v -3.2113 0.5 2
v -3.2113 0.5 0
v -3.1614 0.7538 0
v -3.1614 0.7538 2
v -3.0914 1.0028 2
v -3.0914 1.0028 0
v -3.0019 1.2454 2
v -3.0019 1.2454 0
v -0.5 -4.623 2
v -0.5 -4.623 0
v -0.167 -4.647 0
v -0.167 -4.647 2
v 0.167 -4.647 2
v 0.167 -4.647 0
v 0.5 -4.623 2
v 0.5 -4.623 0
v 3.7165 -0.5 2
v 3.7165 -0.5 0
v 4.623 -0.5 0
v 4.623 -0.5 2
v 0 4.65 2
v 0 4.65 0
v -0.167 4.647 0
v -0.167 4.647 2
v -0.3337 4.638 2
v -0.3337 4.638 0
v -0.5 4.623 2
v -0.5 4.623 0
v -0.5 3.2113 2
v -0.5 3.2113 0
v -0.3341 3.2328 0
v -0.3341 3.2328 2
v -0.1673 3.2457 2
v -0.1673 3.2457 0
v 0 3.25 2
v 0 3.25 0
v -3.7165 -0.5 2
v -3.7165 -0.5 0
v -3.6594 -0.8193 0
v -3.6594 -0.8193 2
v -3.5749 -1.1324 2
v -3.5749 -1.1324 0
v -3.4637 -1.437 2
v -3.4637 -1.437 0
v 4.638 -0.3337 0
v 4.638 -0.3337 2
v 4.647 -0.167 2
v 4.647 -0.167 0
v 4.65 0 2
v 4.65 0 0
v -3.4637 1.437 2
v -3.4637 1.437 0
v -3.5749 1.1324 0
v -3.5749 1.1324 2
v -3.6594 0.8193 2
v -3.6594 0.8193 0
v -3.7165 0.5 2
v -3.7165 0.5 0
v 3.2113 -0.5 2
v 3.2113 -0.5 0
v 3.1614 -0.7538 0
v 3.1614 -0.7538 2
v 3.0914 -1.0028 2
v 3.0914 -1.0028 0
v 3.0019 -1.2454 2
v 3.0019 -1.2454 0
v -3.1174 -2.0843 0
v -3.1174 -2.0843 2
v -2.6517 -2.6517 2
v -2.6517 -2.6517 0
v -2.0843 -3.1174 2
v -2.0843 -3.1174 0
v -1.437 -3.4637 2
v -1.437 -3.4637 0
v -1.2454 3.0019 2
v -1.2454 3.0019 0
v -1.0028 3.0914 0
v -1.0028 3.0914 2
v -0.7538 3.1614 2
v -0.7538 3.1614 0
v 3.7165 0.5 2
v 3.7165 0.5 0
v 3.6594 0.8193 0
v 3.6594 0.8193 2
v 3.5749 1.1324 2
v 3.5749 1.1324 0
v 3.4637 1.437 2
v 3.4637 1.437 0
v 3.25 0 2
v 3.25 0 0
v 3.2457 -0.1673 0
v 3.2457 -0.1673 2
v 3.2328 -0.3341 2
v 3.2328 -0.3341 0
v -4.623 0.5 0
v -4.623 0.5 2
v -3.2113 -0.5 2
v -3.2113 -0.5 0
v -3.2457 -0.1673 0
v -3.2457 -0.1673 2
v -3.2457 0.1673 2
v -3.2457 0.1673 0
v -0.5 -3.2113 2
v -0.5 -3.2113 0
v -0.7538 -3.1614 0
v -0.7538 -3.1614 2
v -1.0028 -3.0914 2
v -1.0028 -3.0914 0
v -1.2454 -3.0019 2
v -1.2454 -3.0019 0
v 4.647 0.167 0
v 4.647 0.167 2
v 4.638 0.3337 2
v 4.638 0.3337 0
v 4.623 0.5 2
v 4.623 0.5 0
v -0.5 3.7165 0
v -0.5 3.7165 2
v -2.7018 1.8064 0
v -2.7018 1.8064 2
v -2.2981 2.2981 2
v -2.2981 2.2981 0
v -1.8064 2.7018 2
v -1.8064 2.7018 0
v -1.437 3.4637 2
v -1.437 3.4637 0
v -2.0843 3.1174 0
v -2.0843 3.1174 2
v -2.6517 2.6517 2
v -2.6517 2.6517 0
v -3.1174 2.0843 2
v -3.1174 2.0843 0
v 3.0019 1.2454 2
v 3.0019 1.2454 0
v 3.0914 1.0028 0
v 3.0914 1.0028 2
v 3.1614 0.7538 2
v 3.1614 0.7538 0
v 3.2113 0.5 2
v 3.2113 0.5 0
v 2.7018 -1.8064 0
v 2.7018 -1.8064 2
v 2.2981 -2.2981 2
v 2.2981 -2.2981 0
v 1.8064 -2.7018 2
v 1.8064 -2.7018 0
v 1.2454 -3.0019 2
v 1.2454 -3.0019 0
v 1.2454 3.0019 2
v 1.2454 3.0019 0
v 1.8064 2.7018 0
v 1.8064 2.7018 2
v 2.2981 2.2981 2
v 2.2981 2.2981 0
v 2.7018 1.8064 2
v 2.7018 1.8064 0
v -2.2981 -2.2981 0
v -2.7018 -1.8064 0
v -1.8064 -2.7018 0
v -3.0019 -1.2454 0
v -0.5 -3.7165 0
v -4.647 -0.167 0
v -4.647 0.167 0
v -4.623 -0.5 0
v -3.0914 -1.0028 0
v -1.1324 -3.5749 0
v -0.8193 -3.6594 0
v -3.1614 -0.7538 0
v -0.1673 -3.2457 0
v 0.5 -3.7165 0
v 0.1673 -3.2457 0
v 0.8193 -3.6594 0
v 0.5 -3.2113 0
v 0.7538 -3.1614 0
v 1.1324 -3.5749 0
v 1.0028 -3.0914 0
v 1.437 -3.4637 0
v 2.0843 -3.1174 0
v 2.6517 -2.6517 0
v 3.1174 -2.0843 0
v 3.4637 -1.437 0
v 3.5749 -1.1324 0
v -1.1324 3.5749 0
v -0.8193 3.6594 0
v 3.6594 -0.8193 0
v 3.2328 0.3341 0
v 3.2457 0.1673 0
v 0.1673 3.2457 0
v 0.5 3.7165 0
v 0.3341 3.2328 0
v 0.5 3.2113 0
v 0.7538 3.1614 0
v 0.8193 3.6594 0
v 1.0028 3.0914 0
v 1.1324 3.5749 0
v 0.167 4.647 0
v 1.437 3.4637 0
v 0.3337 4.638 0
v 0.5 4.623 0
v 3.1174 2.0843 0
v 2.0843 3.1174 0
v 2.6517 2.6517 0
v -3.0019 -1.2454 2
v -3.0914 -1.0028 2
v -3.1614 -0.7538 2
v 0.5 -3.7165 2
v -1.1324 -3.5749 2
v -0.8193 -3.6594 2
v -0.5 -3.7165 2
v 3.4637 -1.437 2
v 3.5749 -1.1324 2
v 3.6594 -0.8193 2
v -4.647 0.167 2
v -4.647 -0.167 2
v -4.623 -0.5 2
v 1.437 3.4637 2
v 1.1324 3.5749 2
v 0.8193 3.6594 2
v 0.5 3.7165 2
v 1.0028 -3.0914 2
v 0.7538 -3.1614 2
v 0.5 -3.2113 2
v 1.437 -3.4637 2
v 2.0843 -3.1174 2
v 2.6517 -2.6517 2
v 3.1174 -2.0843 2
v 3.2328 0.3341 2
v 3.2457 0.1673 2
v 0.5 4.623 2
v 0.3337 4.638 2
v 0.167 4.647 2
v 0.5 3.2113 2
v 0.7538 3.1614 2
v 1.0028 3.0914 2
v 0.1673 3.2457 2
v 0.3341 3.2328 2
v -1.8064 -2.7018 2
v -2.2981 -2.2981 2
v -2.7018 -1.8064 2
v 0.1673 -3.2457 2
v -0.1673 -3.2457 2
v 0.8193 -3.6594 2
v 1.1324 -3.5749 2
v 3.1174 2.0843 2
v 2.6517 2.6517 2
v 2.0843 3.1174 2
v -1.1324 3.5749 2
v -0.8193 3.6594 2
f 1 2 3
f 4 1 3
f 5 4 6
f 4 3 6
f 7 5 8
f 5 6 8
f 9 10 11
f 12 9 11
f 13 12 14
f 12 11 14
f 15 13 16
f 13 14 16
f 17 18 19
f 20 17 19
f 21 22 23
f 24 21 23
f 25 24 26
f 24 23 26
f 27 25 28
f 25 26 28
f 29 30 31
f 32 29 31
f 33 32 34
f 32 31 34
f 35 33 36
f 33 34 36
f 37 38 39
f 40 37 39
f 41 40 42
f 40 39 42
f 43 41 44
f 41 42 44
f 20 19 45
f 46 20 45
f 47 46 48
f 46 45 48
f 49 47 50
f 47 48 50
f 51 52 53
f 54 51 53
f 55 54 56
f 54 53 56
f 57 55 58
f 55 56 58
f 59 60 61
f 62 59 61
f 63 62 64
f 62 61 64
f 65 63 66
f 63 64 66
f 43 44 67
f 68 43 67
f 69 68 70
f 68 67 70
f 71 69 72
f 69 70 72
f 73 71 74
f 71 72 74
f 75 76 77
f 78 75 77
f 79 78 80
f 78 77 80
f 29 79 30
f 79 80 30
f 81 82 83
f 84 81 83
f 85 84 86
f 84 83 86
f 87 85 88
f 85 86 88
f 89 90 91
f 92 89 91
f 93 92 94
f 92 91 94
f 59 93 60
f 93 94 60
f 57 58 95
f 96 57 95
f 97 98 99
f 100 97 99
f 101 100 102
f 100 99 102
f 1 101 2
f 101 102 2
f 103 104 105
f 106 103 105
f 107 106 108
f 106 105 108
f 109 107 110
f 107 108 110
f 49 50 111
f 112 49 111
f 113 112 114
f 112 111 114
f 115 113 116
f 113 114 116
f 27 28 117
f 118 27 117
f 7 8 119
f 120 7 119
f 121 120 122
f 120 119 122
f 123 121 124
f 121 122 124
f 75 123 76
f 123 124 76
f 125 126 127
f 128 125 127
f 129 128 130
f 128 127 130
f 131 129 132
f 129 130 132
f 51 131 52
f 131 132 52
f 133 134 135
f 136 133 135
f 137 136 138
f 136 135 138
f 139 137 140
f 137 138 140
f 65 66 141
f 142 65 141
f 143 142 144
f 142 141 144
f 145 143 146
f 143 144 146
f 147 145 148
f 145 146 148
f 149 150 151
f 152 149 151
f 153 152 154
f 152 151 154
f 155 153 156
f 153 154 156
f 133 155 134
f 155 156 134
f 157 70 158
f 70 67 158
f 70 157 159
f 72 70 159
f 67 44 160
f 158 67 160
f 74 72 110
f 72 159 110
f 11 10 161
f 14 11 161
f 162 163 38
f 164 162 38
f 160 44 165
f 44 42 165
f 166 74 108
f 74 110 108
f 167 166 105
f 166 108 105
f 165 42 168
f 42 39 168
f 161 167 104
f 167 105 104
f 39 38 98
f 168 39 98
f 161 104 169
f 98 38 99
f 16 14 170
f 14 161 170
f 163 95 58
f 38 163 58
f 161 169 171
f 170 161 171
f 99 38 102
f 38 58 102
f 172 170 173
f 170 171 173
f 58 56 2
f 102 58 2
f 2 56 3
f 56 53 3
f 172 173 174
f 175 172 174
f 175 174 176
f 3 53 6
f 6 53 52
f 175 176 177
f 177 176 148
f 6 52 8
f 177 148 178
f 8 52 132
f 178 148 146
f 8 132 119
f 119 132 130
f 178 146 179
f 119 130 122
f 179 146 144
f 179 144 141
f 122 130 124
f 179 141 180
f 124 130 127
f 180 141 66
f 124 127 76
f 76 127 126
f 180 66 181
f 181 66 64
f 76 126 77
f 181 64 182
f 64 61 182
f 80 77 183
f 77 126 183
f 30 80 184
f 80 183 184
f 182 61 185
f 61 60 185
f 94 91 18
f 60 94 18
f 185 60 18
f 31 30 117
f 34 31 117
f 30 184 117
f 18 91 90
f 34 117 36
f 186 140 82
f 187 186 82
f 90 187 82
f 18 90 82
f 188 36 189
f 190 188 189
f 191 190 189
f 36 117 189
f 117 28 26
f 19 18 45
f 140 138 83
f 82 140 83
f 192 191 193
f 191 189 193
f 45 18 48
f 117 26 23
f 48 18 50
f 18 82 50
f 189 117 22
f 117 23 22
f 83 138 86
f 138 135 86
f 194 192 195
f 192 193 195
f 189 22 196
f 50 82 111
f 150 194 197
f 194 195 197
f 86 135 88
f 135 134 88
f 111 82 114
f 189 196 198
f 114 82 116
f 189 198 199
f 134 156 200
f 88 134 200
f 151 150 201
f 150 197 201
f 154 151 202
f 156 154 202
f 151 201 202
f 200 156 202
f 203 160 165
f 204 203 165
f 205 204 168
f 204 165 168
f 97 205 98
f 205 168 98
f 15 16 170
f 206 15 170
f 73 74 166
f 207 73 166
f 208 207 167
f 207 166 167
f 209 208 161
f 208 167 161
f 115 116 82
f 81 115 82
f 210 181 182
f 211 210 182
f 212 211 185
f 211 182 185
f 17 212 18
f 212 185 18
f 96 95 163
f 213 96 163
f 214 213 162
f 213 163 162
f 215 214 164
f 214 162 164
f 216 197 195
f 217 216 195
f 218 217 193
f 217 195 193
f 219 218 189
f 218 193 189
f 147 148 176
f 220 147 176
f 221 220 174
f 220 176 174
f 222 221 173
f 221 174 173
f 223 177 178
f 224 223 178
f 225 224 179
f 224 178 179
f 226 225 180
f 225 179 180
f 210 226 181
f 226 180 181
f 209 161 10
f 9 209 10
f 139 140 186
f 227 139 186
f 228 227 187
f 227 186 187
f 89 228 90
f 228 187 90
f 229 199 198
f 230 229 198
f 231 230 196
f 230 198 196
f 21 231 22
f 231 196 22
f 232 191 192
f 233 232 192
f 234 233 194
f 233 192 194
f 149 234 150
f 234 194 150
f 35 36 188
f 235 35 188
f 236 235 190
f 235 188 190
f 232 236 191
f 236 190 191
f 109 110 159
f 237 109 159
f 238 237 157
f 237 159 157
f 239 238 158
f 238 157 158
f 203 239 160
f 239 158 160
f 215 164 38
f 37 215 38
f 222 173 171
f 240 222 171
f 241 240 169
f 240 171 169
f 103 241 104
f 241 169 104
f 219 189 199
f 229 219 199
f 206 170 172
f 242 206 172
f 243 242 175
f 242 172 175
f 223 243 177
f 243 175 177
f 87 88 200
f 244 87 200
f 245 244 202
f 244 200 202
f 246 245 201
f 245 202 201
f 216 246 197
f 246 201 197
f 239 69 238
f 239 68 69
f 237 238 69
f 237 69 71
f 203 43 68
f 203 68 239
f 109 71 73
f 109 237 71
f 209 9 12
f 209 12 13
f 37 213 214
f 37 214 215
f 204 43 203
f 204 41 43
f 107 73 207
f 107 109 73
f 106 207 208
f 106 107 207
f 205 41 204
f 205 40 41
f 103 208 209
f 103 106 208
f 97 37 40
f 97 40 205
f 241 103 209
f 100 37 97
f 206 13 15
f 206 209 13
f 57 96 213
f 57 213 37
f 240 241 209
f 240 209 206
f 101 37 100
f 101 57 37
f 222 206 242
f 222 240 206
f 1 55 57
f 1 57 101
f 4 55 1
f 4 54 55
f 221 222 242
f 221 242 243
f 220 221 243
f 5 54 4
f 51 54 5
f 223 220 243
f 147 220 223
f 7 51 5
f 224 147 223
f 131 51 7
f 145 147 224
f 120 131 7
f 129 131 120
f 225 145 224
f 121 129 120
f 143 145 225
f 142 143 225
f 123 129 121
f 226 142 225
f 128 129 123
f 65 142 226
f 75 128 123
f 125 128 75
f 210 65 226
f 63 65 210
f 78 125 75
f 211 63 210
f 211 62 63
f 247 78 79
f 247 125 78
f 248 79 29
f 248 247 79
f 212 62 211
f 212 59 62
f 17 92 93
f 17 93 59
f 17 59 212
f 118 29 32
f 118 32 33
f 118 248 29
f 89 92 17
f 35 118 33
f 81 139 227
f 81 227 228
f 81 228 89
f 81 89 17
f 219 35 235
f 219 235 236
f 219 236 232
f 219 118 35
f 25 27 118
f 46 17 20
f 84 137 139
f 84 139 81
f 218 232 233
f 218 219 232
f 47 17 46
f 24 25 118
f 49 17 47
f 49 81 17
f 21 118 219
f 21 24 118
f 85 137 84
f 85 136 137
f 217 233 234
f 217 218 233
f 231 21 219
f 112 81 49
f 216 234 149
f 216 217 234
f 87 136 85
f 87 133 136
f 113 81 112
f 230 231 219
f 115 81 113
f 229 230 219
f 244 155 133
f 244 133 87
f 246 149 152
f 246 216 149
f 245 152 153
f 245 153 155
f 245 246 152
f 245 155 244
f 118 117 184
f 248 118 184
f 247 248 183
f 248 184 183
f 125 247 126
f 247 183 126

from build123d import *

# Parameters (mm, degrees)
F1_DEPTH = 2


with BuildPart() as f1:
    # F0 (on Top) → F1 (new body)
    with BuildSketch(Plane.XY):
        with BuildLine():
            ThreePointArc((0, 4.15), (0.2504565274, 4.1424354585), (0.5, 4.119769411))
            Line((0.5, 4.119769411), (0.5, 4.6230401253))
            ThreePointArc((0.5, 4.6230401253), (0.2503631537, 4.6432551396), (0, 4.65))
            Line((0, 4.65), (0, 4.15))
        make_face()
        with BuildLine():
            ThreePointArc((-0.5, 4.119769411), (-0.2504565274, 4.1424354585), (0, 4.15))
            Line((0, 4.15), (0, 4.65))
            ThreePointArc((0, 4.65), (-0.2503631537, 4.6432551396), (-0.5, 4.6230401253))
            Line((-0.5, 4.6230401253), (-0.5, 4.119769411))
        make_face()
        with BuildLine():
            ThreePointArc((-0.5, 3.7165171868), (-0.2505599224, 3.7416199333), (0, 3.75))
            Line((0, 3.75), (0, 4.15))
            ThreePointArc((0, 4.15), (-0.2504565274, 4.1424354585), (-0.5, 4.119769411))
            Line((-0.5, 4.119769411), (-0.5, 3.7165171868))
        make_face()
        with BuildLine():
            ThreePointArc((0, 3.75), (0.2505599224, 3.7416199333), (0.5, 3.7165171868))
            Line((0.5, 3.7165171868), (0.5, 4.119769411))
            ThreePointArc((0.5, 4.119769411), (0.2504565274, 4.1424354585), (0, 4.15))
            Line((0, 4.15), (0, 3.75))
        make_face()
        with BuildLine():
            ThreePointArc((0, 3.25), (0.2507474126, 3.2403125984), (0.5, 3.2113081447))
            Line((0.5, 3.2113081447), (0.5, 3.7165171868))
            ThreePointArc((0.5, 3.7165171868), (0.2505599224, 3.7416199333), (0, 3.75))
            Line((0, 3.75), (0, 3.25))
        make_face()
        with BuildLine():
            ThreePointArc((-0.5, 3.2113081447), (-0.2507474126, 3.2403125984), (0, 3.25))
            Line((0, 3.25), (0, 3.75))
            ThreePointArc((0, 3.75), (-0.2505599224, 3.7416199333), (-0.5, 3.7165171868))
            Line((-0.5, 3.7165171868), (-0.5, 3.2113081447))
        make_face()
        with BuildLine():
            ThreePointArc((-1.2454248934, 3.0019022028), (-0.8789708338, 3.128883231), (-0.5, 3.2113081447))
            Line((-0.5, 3.2113081447), (-0.5, 3.7165171868))
            ThreePointArc((-0.5, 3.7165171868), (-0.9767266714, 3.6205669459), (-1.4370287231, 3.4637333109))
            Line((-1.4370287231, 3.4637333109), (-1.2454248934, 3.0019022028))
        make_face()
        with BuildLine():
            ThreePointArc((0.5, 3.2113081447), (0.8789708338, 3.128883231), (1.2454248934, 3.0019022028))
            Line((1.2454248934, 3.0019022028), (1.4370287231, 3.4637333109))
            ThreePointArc((1.4370287231, 3.4637333109), (0.9767266714, 3.6205669459), (0.5, 3.7165171868))
            Line((0.5, 3.7165171868), (0.5, 3.2113081447))
        make_face()
        with BuildLine():
            ThreePointArc((1.2454248934, 3.0019022028), (2.2980970389, 2.2980970389), (3.0019022028, 1.2454248934))
            Line((3.0019022028, 1.2454248934), (3.4637333109, 1.4370287231))
            ThreePointArc((3.4637333109, 1.4370287231), (2.6516504294, 2.6516504294), (1.4370287231, 3.4637333109))
            Line((1.4370287231, 3.4637333109), (1.2454248934, 3.0019022028))
        make_face()
        with BuildLine():
            ThreePointArc((-3.0019022028, 1.2454248934), (-2.2980970389, 2.2980970389), (-1.2454248934, 3.0019022028))
            Line((-1.2454248934, 3.0019022028), (-1.4370287231, 3.4637333109))
            ThreePointArc((-1.4370287231, 3.4637333109), (-2.6516504294, 2.6516504294), (-3.4637333109, 1.4370287231))
            Line((-3.4637333109, 1.4370287231), (-3.0019022028, 1.2454248934))
        make_face()
        with BuildLine():
            ThreePointArc((-3.2113081447, 0.5), (-3.128883231, 0.8789708338), (-3.0019022028, 1.2454248934))
            Line((-3.0019022028, 1.2454248934), (-3.4637333109, 1.4370287231))
            ThreePointArc((-3.4637333109, 1.4370287231), (-3.6205669459, 0.9767266714), (-3.7165171868, 0.5))
            Line((-3.7165171868, 0.5), (-3.2113081447, 0.5))
        make_face()
        with BuildLine():
            ThreePointArc((-3.2113081447, -0.5), (-3.25, 0), (-3.2113081447, 0.5))
            Line((-3.2113081447, 0.5), (-3.7165171868, 0.5))
            ThreePointArc((-3.7165171868, 0.5), (-3.75, 0), (-3.7165171868, -0.5))
            Line((-3.7165171868, -0.5), (-3.2113081447, -0.5))
        make_face()
        with BuildLine():
            ThreePointArc((-3.0019022028, -1.2454248934), (-3.128883231, -0.8789708338), (-3.2113081447, -0.5))
            Line((-3.2113081447, -0.5), (-3.7165171868, -0.5))
            ThreePointArc((-3.7165171868, -0.5), (-3.6205669459, -0.9767266714), (-3.4637333109, -1.4370287231))
            Line((-3.4637333109, -1.4370287231), (-3.0019022028, -1.2454248934))
        make_face()
        with BuildLine():
            ThreePointArc((3.0019022028, 1.2454248934), (3.128883231, 0.8789708338), (3.2113081447, 0.5))
            Line((3.2113081447, 0.5), (3.7165171868, 0.5))
            ThreePointArc((3.7165171868, 0.5), (3.6205669459, 0.9767266714), (3.4637333109, 1.4370287231))
            Line((3.4637333109, 1.4370287231), (3.0019022028, 1.2454248934))
        make_face()
        with BuildLine():
            Line((-1.4370287231, -3.4637333109), (-1.2454248934, -3.0019022028))
            ThreePointArc((-1.2454248934, -3.0019022028), (-2.2980970389, -2.2980970389), (-3.0019022028, -1.2454248934))
            Line((-3.0019022028, -1.2454248934), (-3.4637333109, -1.4370287231))
            ThreePointArc((-3.4637333109, -1.4370287231), (-2.6516504294, -2.6516504294), (-1.4370287231, -3.4637333109))
        make_face()
        with BuildLine():
            Line((-0.5, -3.7165171868), (-0.5, -3.2113081447))
            ThreePointArc((-0.5, -3.2113081447), (-0.8789708338, -3.128883231), (-1.2454248934, -3.0019022028))
            Line((-1.2454248934, -3.0019022028), (-1.4370287231, -3.4637333109))
            ThreePointArc((-1.4370287231, -3.4637333109), (-0.9767266714, -3.6205669459), (-0.5, -3.7165171868))
        make_face()
        with BuildLine():
            Line((0.5, -3.7165171868), (0.5, -3.2113081447))
            ThreePointArc((0.5, -3.2113081447), (0, -3.25), (-0.5, -3.2113081447))
            Line((-0.5, -3.2113081447), (-0.5, -3.7165171868))
            ThreePointArc((-0.5, -3.7165171868), (0, -3.75), (0.5, -3.7165171868))
        make_face()
        with BuildLine():
            Line((1.4370287231, -3.4637333109), (1.2454248934, -3.0019022028))
            ThreePointArc((1.2454248934, -3.0019022028), (0.8789708338, -3.128883231), (0.5, -3.2113081447))
            Line((0.5, -3.2113081447), (0.5, -3.7165171868))
            ThreePointArc((0.5, -3.7165171868), (0.9767266714, -3.6205669459), (1.4370287231, -3.4637333109))
        make_face()
        with BuildLine():
            Line((3.4637333109, -1.4370287231), (3.0019022028, -1.2454248934))
            ThreePointArc((3.0019022028, -1.2454248934), (2.2980970389, -2.2980970389), (1.2454248934, -3.0019022028))
            Line((1.2454248934, -3.0019022028), (1.4370287231, -3.4637333109))
            ThreePointArc((1.4370287231, -3.4637333109), (2.6516504294, -2.6516504294), (3.4637333109, -1.4370287231))
        make_face()
        with BuildLine():
            Line((3.7165171868, -0.5), (3.2113081447, -0.5))
            ThreePointArc((3.2113081447, -0.5), (3.128883231, -0.8789708338), (3.0019022028, -1.2454248934))
            Line((3.0019022028, -1.2454248934), (3.4637333109, -1.4370287231))
            ThreePointArc((3.4637333109, -1.4370287231), (3.6205669459, -0.9767266714), (3.7165171868, -0.5))
        make_face()
        with BuildLine():
            ThreePointArc((3.2113081447, 0.5), (3.2403125984, 0.2507474126), (3.25, 0))
            ThreePointArc((3.25, 0), (3.2403125984, -0.2507474126), (3.2113081447, -0.5))
            Line((3.2113081447, -0.5), (3.7165171868, -0.5))
            ThreePointArc((3.7165171868, -0.5), (3.7416199333, -0.2505599224), (3.75, 0))
            ThreePointArc((3.75, 0), (3.7416199333, 0.2505599224), (3.7165171868, 0.5))
            Line((3.7165171868, 0.5), (3.2113081447, 0.5))
        make_face()
        with BuildLine():
            Line((4.119769411, 0.5), (3.7165171868, 0.5))
            ThreePointArc((3.7165171868, 0.5), (3.7416199333, 0.2505599224), (3.75, 0))
            ThreePointArc((3.75, 0), (3.7416199333, -0.2505599224), (3.7165171868, -0.5))
            Line((3.7165171868, -0.5), (4.119769411, -0.5))
            ThreePointArc((4.119769411, -0.5), (4.1424354585, -0.2504565274), (4.15, 0))
            ThreePointArc((4.15, 0), (4.1424354585, 0.2504565274), (4.119769411, 0.5))
        make_face()
        with BuildLine():
            ThreePointArc((-3.7165171868, -0.5), (-3.75, 0), (-3.7165171868, 0.5))
            Line((-3.7165171868, 0.5), (-4.119769411, 0.5))
            ThreePointArc((-4.119769411, 0.5), (-4.15, 0), (-4.119769411, -0.5))
            Line((-4.119769411, -0.5), (-3.7165171868, -0.5))
        make_face()
        with BuildLine():
            Line((0.5, -4.119769411), (0.5, -3.7165171868))
            ThreePointArc((0.5, -3.7165171868), (0, -3.75), (-0.5, -3.7165171868))
            Line((-0.5, -3.7165171868), (-0.5, -4.119769411))
            ThreePointArc((-0.5, -4.119769411), (0, -4.15), (0.5, -4.119769411))
        make_face()
        with BuildLine():
            Line((4.6230401253, 0.5), (4.119769411, 0.5))
            ThreePointArc((4.119769411, 0.5), (4.1424354585, 0.2504565274), (4.15, 0))
            ThreePointArc((4.15, 0), (4.1424354585, -0.2504565274), (4.119769411, -0.5))
            Line((4.119769411, -0.5), (4.6230401253, -0.5))
            ThreePointArc((4.6230401253, -0.5), (4.6432551396, -0.2503631537), (4.65, 0))
            ThreePointArc((4.65, 0), (4.6432551396, 0.2503631537), (4.6230401253, 0.5))
        make_face()
        with BuildLine():
            ThreePointArc((-4.119769411, -0.5), (-4.15, 0), (-4.119769411, 0.5))
            Line((-4.119769411, 0.5), (-4.6230401253, 0.5))
            ThreePointArc((-4.6230401253, 0.5), (-4.65, 0), (-4.6230401253, -0.5))
            Line((-4.6230401253, -0.5), (-4.119769411, -0.5))
        make_face()
        with BuildLine():
            Line((0.5, -4.6230401253), (0.5, -4.119769411))
            ThreePointArc((0.5, -4.119769411), (0, -4.15), (-0.5, -4.119769411))
            Line((-0.5, -4.119769411), (-0.5, -4.6230401253))
            ThreePointArc((-0.5, -4.6230401253), (0, -4.65), (0.5, -4.6230401253))
        make_face()
    extrude(amount=F1_DEPTH)


solid = f1.part
